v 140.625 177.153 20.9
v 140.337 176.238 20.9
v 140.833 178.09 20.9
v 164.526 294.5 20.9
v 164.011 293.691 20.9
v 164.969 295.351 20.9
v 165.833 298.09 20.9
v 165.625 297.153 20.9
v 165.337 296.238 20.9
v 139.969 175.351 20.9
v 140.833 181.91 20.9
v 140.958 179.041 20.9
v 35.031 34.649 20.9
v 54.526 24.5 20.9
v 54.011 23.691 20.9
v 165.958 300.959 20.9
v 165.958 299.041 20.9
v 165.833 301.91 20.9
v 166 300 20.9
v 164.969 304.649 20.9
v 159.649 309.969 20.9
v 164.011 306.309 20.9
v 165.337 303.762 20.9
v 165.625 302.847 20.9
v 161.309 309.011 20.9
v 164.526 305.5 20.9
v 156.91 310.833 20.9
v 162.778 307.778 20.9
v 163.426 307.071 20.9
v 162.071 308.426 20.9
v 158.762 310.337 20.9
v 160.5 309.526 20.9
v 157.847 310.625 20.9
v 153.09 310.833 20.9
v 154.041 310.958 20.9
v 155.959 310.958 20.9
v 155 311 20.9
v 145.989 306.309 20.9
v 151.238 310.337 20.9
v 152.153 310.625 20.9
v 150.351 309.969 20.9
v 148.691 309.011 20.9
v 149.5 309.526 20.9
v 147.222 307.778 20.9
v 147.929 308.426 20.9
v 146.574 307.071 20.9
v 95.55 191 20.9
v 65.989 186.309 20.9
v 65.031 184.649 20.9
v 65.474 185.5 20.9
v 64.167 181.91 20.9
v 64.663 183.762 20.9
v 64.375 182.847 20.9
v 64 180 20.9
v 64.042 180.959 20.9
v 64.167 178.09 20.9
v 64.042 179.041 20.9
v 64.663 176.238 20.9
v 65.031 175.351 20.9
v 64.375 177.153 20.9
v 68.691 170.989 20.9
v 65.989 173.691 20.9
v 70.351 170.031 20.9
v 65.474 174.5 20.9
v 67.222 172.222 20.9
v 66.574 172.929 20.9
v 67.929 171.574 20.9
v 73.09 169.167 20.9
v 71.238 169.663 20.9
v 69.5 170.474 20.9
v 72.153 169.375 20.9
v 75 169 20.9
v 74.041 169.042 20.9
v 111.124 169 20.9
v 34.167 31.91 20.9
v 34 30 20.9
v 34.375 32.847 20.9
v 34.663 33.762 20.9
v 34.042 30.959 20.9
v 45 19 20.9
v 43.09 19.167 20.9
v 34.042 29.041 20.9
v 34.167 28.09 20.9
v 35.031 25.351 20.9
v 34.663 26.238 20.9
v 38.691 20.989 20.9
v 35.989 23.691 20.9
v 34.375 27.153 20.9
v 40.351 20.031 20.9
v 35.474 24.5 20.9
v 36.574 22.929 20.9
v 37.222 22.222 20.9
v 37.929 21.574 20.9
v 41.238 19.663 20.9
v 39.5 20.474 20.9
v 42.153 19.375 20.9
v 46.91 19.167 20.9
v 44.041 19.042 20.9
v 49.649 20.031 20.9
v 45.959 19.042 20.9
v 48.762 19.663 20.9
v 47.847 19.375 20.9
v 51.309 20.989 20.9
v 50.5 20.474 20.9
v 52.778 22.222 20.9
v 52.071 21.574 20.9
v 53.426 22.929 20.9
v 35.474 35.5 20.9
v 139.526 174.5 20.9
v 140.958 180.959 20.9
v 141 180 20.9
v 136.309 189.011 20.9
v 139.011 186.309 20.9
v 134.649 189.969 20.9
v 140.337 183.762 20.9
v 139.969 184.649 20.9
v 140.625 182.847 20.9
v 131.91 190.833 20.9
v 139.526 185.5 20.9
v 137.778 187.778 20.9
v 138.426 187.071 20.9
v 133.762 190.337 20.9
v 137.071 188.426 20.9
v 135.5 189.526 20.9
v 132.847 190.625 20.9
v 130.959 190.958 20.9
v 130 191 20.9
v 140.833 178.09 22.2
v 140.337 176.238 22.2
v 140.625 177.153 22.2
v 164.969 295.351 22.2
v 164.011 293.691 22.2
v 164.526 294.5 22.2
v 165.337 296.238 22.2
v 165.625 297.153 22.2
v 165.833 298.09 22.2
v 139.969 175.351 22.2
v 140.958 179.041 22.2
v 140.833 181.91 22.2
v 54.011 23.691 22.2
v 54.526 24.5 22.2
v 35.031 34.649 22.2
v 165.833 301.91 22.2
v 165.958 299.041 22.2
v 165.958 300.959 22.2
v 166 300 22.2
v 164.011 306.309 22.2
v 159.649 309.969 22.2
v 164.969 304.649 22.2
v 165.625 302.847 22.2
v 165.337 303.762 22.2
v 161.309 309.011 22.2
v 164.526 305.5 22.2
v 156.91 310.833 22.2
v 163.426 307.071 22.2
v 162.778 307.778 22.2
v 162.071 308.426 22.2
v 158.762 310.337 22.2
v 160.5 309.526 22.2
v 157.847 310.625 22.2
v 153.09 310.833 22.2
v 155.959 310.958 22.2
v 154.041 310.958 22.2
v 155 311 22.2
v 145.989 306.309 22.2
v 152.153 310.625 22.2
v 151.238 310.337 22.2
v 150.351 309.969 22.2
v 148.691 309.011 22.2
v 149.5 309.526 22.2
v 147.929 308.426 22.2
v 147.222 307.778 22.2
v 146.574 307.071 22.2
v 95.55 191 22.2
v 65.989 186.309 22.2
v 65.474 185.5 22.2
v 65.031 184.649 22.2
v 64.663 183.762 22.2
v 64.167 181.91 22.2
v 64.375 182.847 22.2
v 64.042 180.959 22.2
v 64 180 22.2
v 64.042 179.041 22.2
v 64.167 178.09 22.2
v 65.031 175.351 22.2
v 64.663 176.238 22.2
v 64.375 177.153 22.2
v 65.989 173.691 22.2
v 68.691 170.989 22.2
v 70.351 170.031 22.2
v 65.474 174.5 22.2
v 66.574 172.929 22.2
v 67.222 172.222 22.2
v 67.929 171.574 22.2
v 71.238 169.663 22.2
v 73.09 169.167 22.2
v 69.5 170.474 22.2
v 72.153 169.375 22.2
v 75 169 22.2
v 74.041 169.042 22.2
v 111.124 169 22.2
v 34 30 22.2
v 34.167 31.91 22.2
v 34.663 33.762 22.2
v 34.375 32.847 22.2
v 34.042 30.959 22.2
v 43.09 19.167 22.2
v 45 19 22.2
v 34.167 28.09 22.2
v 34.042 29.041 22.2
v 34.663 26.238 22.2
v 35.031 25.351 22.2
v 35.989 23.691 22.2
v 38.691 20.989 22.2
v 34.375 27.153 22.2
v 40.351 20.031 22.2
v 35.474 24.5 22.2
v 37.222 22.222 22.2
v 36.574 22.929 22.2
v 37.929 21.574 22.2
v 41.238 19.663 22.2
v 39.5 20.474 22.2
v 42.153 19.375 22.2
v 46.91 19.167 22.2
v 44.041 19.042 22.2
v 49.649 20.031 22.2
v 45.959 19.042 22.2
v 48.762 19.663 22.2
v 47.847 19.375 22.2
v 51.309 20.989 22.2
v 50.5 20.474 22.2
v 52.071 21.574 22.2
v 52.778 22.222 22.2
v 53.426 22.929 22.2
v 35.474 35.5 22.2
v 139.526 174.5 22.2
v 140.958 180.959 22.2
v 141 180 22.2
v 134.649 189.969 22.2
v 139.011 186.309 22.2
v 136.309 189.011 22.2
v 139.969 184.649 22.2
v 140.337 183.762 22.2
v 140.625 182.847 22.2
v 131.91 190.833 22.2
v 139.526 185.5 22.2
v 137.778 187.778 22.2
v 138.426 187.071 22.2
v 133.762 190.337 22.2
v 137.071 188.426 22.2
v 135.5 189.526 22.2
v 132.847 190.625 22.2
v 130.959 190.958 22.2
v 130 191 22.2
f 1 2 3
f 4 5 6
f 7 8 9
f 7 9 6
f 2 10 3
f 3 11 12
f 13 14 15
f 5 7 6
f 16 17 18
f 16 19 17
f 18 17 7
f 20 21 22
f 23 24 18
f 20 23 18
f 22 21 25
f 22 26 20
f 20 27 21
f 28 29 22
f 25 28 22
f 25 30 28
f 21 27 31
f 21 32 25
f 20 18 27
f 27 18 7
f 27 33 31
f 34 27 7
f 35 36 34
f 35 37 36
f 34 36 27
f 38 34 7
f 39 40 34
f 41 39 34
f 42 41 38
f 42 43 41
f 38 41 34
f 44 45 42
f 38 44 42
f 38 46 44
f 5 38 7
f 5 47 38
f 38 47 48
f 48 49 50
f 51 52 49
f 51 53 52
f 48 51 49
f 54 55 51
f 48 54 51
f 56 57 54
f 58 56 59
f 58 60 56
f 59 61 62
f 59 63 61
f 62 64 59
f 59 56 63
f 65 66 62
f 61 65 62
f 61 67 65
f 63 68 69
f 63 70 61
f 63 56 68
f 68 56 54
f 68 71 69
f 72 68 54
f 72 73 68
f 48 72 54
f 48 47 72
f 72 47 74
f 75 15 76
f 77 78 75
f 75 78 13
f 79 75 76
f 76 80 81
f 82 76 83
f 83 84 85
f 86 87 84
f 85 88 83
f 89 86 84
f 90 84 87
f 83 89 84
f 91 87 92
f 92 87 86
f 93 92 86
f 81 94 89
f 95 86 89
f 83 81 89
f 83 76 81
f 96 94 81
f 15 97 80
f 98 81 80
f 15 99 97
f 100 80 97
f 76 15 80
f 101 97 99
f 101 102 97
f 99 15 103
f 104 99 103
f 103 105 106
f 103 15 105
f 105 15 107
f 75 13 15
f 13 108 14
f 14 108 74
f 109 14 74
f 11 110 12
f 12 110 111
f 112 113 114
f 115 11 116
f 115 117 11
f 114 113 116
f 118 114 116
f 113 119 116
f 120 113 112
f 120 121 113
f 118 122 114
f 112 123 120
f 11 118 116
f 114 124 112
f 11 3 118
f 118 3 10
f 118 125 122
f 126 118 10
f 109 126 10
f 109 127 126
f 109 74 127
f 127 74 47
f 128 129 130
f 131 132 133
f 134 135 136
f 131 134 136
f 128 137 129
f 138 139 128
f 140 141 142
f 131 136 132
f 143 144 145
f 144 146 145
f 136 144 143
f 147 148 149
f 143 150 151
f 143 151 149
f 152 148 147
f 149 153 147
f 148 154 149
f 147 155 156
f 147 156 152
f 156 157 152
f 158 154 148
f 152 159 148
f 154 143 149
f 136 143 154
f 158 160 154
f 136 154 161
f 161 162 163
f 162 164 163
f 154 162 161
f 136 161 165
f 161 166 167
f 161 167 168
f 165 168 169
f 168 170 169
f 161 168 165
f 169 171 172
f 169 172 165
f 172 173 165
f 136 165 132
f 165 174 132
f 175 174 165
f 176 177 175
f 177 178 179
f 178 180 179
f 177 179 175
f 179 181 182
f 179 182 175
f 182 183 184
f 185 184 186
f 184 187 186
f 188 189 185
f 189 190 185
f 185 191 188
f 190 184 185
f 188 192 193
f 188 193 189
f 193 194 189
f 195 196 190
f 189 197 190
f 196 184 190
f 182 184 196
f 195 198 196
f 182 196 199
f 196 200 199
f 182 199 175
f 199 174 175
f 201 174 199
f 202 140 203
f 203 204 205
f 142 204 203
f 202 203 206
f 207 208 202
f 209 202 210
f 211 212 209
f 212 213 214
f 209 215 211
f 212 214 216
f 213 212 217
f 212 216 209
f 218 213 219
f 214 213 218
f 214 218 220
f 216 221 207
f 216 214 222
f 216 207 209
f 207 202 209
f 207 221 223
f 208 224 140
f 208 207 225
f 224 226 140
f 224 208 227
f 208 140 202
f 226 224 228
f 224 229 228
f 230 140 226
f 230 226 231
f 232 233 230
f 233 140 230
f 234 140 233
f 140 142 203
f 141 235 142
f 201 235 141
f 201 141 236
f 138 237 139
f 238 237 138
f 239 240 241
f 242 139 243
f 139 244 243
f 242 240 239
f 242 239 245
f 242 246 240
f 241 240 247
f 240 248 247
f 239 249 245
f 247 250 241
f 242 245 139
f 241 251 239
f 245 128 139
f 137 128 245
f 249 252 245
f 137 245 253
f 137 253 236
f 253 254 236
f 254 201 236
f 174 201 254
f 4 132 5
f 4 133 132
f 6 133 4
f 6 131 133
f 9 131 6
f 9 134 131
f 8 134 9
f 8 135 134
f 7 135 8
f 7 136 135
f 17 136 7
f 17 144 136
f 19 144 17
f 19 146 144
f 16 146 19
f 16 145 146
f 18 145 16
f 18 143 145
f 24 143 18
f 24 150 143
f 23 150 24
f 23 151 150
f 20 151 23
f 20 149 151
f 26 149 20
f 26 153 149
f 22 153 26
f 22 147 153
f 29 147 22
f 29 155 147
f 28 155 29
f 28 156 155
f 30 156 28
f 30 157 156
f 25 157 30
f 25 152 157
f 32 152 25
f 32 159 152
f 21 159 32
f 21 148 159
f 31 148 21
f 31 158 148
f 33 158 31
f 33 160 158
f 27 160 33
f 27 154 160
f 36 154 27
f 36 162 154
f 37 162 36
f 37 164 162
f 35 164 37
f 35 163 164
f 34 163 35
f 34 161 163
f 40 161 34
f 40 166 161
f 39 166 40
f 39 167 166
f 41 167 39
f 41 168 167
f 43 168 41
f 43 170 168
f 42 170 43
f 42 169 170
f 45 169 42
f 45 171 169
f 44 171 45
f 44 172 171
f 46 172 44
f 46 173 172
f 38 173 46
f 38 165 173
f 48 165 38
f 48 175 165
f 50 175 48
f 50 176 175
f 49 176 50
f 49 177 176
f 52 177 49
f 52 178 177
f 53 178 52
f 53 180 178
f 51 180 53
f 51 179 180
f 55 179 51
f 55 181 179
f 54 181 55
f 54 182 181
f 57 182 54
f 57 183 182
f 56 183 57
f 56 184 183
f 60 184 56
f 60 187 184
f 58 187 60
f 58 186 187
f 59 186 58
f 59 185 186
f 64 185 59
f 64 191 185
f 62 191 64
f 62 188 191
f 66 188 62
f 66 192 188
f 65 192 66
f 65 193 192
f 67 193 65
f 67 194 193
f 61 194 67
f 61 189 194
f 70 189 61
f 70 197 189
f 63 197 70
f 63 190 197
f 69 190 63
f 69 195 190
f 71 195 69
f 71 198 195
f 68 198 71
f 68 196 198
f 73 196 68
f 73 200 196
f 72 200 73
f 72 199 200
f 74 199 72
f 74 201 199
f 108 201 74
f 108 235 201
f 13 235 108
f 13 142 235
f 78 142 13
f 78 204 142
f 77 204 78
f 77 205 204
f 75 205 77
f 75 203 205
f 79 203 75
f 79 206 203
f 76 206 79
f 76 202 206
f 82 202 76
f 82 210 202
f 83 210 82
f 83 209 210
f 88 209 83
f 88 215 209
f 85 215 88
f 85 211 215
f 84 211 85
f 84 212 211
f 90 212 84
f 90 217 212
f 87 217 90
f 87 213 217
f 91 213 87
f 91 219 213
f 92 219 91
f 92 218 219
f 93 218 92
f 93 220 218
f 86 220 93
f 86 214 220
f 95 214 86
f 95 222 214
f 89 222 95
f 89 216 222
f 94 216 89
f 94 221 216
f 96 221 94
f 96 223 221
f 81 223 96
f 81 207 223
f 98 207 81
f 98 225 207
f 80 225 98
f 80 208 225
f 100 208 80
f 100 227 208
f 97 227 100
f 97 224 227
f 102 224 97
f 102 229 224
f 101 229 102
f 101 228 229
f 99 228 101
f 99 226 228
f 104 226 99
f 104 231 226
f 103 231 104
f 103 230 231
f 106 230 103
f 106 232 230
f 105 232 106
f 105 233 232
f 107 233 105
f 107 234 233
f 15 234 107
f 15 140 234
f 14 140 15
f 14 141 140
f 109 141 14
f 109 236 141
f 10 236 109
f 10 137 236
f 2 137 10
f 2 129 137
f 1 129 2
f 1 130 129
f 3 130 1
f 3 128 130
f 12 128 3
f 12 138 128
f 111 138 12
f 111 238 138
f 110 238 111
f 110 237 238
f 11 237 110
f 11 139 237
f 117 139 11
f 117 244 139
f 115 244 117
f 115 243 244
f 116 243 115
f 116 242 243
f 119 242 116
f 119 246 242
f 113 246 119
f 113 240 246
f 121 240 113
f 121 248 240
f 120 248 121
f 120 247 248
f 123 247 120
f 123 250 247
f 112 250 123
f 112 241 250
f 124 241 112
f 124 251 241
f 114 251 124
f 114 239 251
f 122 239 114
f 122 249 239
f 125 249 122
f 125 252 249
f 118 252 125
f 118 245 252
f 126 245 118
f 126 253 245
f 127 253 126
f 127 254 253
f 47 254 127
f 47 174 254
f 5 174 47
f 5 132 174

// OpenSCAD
// file: ../collar.scad
// Calibrated press-fit collar, merged into the rear wall at each pixel.
// The STL is symmetric top/bottom (retention lip at mid-height), so insertion
// direction does not matter. Native STL sits X-centered at collar_cx, Z 0..collar_h.

module collar_solid() {
    translate([-collar_cx, 0, 0])
        import(collar_stl, convexity = 6);
}

module place_collar(x, y) {
    translate([x, y, 0]) collar_solid();
}
// file: ../config.scad
// ===== CHARGE LED sign — global config =====
// Edit this file; then run ./build.sh to regenerate every STL.

$fn = 72;

// ---- calibrated collar (press-fit for 12mm bullet pixel) ----
collar_stl    = "../../assets/bullet-collar.stl"; // path resolved from src/parts/ entry files
collar_h      = 2.0;     // Z span of the collar STL
collar_od     = 16.0;    // collar outer diameter
collar_cx     = 43.0;    // STL native X center (Y center is 0)
pixel_through = 12.3;    // clearance hole through the plate (just over bore Ø12.19)
dome_clear    = 4.0;     // dome protrusion above plate front. Spec: 5.5mm dome-tip-to-flange,
                         // flange seats on plate back, minus 2mm plate ~= 3.5-4mm. Seat a real
                         // pixel and measure to lock it in.

// ---- shell ----
plate_t    = 2.0;        // rear plate thickness (== collar_h, so the collar sits flush)
wall_t     = 2.5;        // chimney wall thickness
cell_inner = 30;         // square interior of each test cell (the press-fit opening)

// ---- diffuser panels (flat, drop-in — kept for the final glued option) ----
panel_press_clear = 0.25; // panel is this much SMALLER than the opening (total) -> friction fit
panel_thicks      = [1, 2, 3];

// ---- diffuser CAP (slides over an ISOLATED chimney; not used on touching rows) ----
cap_fit_clear = 0.4;   // skirt-inner minus chimney-outer (total); bigger = looser slide
cap_skirt_t   = 1.6;   // skirt wall thickness
cap_skirt_h   = 7;     // how far the skirt grips down over the chimney

// ---- diffuser LID = flanged plug (plug locates in the opening, flange catches on the rim) ----
lid_flange_cover = wall_t;  // flange overhang per side ~= wall width (rests on rim, can't fall in)
lid_flange_gap   = 0.3;     // shrink the flange a hair so neighbour lids don't clash
lid_plug_h       = 4;       // how far the plug drops into the opening (0 = plain flat tile)
lid_plug_clear   = 0.5;     // plug-outer = opening minus this (total) -> snug slip fit
lid_plug_wall    = 1.5;     // plug-frame wall thickness

// ---- coupon depth ladder ----
led_gaps = [20, 35, 50]; // clear LED-tip -> panel distance, per cell (mm)

// ---- collar v2: original bore + lip, plus a 45-deg lead-in chamfer ----
bore_face_r   = 6.10;    // collar bore radius at each face (~Ø12.2)
chamfer_depth = 0.5;     // axial depth of the 45-deg lead-in at each face
mouth_r       = bore_face_r + chamfer_depth;  // chamfer mouth radius (~Ø13.2)

// ---- collar A/B test harness ----
harness_w     = 52;      // tile width
harness_d     = 30;      // tile depth
harness_t     = plate_t; // match the real wall thickness for a faithful fit test
harness_pitch = 24;      // spacing between the two hole centers

// ---- derived ----
cell_pitch = cell_inner + 2 * wall_t;      // outer cell footprint (35)
n_cells    = len(led_gaps);
plate_w    = n_cells * cell_pitch;
plate_d    = cell_pitch;
panel_side = cell_inner - panel_press_clear;
function cell_x(i)     = i * cell_pitch + cell_pitch / 2;
function chimney_H(i)  = plate_t + dome_clear + led_gaps[i];
// main file
// Integrated bolt v2 — CLEAR welded lens, baked V3 fuzzy top (filament 2).
// Needs fuzz_bolt.dat (tools/make_fuzz.py ... 1.5 0.8 7 0 0 134 294).
include <../config.scad>
include <../collar.scad>
include <../bolt.scad>
bolt_lens_integrated("fuzz_bolt.dat", 1.5);
